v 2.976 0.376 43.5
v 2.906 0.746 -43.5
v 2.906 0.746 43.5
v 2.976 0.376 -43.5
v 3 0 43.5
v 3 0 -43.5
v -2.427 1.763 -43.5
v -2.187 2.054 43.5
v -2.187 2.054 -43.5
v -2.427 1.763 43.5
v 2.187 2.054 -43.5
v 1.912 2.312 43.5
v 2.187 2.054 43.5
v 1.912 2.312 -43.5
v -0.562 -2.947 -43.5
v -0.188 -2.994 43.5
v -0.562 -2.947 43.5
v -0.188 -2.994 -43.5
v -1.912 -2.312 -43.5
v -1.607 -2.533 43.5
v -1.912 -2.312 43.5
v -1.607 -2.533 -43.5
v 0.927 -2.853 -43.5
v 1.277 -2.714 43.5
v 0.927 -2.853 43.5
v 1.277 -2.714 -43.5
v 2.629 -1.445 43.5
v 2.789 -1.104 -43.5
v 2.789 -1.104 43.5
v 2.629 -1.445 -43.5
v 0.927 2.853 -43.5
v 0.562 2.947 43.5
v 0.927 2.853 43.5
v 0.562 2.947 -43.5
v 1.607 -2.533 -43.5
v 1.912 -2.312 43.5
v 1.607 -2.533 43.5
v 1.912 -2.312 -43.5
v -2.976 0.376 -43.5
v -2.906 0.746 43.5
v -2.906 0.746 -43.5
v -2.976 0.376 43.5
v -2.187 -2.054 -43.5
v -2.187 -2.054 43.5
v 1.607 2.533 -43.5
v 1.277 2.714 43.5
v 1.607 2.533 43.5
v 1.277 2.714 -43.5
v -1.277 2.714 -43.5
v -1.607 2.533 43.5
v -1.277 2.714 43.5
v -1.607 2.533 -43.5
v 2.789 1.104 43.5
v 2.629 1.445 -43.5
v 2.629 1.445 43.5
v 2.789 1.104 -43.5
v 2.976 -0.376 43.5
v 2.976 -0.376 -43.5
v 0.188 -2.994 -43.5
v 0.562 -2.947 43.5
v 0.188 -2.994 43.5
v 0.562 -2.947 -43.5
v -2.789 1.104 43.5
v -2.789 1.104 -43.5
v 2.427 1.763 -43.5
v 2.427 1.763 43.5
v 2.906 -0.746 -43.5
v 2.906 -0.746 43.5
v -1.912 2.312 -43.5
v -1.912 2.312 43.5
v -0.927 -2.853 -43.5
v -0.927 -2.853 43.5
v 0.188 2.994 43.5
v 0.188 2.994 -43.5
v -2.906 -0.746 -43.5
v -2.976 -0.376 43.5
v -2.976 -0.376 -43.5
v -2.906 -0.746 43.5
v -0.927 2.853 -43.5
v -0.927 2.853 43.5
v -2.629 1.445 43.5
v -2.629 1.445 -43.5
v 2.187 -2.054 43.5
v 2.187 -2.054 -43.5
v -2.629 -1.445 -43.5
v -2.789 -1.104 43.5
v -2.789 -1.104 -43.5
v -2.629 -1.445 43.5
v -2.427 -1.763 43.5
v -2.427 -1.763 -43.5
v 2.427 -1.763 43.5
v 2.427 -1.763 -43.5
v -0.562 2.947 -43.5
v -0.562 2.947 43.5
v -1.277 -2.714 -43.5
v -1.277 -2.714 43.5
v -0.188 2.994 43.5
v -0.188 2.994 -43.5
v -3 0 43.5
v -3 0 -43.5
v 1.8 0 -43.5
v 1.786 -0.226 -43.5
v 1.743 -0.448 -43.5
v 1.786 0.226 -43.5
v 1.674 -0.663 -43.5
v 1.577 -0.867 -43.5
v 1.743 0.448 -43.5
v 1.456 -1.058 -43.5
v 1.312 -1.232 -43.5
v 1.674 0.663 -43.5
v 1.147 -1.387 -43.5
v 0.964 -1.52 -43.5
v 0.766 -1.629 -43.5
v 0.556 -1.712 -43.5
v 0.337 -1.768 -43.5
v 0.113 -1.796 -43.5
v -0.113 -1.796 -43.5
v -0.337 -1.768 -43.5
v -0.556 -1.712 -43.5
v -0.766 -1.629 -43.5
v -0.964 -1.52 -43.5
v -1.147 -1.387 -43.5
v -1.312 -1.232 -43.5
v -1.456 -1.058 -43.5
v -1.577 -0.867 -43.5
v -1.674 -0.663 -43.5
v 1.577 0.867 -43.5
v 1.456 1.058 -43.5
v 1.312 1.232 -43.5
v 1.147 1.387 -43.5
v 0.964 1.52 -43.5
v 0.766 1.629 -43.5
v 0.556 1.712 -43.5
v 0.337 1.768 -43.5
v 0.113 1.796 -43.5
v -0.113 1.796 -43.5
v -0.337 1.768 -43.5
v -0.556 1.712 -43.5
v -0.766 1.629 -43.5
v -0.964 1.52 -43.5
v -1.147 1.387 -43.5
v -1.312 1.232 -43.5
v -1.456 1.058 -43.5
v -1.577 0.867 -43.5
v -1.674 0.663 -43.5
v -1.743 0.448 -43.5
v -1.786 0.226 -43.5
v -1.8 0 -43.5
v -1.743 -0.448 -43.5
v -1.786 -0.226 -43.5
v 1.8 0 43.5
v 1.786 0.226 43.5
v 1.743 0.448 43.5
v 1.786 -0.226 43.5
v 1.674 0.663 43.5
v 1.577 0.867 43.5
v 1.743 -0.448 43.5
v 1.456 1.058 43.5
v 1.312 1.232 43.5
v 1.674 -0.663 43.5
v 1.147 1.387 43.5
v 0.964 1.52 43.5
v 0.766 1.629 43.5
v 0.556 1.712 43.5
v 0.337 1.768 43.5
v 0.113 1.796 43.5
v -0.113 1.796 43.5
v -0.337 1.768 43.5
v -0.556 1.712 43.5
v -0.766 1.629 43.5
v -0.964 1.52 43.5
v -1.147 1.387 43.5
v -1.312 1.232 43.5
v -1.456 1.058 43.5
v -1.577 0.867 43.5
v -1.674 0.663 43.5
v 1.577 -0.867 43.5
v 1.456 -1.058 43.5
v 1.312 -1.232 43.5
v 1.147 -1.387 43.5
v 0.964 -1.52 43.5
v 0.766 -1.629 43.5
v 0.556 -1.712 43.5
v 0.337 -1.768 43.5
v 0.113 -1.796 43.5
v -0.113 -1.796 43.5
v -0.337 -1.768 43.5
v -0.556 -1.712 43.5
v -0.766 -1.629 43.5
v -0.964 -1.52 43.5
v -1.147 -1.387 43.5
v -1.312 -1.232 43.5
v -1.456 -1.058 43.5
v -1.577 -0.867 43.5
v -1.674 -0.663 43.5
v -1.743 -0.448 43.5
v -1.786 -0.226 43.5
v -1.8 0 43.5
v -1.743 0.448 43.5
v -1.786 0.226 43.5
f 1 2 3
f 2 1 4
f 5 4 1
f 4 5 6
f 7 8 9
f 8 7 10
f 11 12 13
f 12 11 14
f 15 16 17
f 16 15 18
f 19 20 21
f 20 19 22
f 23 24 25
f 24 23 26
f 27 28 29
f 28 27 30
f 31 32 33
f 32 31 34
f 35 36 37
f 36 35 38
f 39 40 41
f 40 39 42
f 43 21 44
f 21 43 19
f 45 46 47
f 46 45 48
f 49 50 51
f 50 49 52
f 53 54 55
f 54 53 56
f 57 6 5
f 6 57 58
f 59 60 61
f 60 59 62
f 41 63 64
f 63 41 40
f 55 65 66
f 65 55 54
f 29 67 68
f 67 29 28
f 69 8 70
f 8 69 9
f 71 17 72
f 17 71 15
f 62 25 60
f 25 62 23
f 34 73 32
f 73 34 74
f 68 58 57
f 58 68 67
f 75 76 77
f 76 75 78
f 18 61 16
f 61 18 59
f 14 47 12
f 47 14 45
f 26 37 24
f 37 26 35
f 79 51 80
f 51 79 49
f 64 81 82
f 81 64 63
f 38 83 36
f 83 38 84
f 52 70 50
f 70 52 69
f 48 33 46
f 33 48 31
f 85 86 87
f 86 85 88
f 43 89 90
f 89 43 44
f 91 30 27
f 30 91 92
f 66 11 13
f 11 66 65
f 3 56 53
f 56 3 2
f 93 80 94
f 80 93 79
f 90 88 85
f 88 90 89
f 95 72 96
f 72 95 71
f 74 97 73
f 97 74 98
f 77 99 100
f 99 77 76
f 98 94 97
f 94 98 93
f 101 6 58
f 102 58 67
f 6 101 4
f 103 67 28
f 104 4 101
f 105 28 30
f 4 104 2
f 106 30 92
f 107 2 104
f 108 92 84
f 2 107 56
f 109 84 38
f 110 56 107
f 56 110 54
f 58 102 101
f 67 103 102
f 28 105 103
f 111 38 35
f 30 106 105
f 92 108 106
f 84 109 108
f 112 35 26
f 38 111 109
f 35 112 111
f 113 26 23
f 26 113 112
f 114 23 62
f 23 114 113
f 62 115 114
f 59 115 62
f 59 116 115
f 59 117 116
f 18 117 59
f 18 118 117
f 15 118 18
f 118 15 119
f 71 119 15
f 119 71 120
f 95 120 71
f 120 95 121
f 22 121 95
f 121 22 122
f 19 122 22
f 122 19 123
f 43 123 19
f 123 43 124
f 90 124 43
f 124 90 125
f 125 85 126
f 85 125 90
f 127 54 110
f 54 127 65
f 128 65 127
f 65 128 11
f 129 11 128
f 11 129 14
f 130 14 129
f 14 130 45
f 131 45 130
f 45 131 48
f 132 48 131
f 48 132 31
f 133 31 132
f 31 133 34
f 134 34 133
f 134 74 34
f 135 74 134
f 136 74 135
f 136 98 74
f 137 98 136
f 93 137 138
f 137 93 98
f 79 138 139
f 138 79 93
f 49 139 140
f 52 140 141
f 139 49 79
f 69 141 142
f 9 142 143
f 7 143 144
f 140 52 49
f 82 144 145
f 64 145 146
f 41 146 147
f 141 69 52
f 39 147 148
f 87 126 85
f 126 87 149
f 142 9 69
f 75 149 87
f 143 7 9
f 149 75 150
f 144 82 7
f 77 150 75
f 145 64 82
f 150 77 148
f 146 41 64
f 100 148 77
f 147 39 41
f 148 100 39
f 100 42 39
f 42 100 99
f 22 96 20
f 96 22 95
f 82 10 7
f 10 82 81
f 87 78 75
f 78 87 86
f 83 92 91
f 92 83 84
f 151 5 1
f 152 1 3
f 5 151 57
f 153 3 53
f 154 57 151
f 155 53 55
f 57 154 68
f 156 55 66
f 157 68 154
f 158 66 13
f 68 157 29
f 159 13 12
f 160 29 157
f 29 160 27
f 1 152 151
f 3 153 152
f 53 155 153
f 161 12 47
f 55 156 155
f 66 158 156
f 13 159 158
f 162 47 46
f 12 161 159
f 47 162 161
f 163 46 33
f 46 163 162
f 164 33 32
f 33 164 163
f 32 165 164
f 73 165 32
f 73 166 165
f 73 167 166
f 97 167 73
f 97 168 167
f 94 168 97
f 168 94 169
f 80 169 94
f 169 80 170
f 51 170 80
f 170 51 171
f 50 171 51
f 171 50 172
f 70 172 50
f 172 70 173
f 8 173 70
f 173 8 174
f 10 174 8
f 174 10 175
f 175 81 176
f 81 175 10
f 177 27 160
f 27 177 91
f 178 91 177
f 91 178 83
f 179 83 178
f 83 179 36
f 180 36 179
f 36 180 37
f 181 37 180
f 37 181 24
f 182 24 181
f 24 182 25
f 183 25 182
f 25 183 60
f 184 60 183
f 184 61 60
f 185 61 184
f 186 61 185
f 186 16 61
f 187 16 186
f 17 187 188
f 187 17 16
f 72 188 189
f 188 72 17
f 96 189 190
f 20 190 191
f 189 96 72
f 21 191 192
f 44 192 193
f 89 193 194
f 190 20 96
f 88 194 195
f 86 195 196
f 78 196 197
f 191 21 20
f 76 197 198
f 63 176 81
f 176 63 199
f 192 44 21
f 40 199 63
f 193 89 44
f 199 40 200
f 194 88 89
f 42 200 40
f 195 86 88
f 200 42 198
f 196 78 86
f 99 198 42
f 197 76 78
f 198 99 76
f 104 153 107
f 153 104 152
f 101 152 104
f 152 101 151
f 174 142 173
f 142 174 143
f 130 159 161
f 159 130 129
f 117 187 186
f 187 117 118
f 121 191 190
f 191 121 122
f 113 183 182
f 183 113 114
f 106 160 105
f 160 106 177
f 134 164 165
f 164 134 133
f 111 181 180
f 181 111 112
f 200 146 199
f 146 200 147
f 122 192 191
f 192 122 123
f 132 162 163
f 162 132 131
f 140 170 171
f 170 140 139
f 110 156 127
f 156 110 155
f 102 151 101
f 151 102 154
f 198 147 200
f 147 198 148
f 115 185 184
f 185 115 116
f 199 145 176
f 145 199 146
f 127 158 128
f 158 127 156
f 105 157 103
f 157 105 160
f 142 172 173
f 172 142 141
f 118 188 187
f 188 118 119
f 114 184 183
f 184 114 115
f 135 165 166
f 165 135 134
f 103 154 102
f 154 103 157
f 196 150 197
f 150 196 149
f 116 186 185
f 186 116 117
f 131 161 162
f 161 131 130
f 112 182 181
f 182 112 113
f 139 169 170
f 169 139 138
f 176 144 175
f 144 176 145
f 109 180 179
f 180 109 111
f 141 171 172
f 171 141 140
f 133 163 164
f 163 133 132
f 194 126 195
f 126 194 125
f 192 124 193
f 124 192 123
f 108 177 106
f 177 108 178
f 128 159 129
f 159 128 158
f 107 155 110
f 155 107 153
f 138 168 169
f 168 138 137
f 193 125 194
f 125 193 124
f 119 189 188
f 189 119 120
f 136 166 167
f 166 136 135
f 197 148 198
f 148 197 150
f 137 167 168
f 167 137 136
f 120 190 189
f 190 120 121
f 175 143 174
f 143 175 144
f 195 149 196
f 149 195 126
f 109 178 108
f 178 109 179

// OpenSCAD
$fn = 50;


difference() {
	union() {
		translate(v = [0, 0, -43.5000000000]) {
			cylinder(h = 87, r = 3.0000000000);
		}
	}
	union() {
		#translate(v = [0, 0, -100.0000000000]) {
			cylinder(h = 200, r = 1.8000000000);
		}
	}
}
